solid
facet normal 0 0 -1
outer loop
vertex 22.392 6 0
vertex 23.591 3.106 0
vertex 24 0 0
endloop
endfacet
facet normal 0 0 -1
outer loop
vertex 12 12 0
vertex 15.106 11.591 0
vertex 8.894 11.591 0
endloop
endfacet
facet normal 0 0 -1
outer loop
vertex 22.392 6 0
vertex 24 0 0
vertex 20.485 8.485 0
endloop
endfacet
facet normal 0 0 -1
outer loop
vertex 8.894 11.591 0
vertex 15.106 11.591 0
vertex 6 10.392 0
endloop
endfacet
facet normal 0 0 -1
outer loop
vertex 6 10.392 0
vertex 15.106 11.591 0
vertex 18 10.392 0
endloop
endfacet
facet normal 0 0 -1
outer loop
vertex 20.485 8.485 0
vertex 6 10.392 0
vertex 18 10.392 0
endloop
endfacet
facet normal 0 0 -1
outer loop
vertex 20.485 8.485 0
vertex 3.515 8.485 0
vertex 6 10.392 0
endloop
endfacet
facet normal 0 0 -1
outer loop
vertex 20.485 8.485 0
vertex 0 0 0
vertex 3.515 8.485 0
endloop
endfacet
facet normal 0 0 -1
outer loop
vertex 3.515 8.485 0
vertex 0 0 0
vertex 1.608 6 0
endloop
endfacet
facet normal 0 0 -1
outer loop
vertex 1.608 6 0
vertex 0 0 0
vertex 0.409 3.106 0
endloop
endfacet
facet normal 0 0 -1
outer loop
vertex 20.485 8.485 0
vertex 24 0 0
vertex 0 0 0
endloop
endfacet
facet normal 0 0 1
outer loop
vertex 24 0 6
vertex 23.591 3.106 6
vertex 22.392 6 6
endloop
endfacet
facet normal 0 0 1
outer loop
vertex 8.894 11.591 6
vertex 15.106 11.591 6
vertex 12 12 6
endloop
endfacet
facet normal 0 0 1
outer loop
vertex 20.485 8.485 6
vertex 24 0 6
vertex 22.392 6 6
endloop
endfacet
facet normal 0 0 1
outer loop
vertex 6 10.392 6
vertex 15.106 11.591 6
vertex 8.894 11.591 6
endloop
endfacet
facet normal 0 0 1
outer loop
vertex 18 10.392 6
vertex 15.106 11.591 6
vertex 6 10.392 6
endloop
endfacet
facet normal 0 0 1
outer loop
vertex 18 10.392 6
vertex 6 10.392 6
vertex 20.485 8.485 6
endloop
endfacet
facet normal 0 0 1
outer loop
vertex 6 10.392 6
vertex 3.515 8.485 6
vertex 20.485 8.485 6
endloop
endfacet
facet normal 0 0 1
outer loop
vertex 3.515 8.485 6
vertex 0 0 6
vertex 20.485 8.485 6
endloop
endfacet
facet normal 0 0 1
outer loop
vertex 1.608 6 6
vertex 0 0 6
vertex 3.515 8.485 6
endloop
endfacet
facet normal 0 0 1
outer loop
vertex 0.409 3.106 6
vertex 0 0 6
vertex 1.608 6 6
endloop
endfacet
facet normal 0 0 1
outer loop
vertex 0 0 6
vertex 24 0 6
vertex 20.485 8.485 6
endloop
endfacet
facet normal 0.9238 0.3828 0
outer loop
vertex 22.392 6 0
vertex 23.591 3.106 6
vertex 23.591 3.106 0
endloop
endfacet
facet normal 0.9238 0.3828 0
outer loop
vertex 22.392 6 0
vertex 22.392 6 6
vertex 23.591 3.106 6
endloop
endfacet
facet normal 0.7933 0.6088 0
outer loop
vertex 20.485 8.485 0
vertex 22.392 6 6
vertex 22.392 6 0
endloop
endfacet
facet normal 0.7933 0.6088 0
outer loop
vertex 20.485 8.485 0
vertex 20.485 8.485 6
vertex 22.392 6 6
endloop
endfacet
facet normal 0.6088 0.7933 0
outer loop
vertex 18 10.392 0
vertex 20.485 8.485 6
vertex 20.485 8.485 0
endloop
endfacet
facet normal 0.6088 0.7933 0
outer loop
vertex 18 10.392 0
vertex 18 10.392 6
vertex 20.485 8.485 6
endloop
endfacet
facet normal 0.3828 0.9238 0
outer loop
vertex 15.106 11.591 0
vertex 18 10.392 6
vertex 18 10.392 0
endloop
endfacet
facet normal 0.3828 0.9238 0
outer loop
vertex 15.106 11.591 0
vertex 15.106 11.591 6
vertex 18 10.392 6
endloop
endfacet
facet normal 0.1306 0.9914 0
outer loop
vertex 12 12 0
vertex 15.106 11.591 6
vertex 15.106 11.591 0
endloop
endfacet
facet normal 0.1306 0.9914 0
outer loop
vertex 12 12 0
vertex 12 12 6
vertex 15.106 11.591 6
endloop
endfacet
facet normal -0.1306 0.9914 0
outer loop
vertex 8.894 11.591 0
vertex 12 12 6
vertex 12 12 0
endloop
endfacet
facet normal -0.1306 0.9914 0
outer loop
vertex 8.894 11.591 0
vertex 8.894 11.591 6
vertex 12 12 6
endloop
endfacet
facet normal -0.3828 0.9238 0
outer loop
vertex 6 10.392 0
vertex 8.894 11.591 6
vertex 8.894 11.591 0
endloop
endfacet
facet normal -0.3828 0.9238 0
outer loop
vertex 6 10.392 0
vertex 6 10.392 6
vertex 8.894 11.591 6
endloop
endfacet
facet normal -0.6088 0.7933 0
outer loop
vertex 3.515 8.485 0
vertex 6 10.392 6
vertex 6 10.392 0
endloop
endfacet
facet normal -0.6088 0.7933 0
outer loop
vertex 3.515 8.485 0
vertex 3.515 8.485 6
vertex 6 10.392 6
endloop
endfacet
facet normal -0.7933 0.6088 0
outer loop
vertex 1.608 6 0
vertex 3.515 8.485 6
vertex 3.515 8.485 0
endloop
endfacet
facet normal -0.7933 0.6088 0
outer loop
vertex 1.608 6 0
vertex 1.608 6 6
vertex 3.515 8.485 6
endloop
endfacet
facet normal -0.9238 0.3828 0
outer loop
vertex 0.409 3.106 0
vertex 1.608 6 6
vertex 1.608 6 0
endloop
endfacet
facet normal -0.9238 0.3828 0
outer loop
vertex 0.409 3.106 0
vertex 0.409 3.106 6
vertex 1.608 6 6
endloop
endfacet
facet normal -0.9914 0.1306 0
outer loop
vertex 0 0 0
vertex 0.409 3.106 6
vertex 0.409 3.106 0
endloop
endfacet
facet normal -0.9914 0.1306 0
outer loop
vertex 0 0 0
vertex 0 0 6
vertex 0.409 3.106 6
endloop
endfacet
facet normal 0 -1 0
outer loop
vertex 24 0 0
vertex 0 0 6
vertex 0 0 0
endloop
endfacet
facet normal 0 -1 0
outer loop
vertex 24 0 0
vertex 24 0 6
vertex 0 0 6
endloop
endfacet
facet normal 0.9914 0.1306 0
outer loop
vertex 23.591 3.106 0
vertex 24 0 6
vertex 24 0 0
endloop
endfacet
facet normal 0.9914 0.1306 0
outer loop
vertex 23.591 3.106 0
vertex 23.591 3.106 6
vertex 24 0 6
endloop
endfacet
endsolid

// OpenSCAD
$fn = 32;

// ----------------------------------------------------------------------
// Key bar: woodruff key, 6 mm thick
// ----------------------------------------------------------------------

// --- parameters (mm) ---
profile_height = 6;       // extrusion height
profile_points = 13;      // points of the closed outline

profile = [[24, 0], [23.591, 3.106], [22.392, 6], [20.485, 8.485], [18, 10.392], [15.106, 11.591], [12, 12], [8.894, 11.591], [6, 10.392], [3.515, 8.485], [1.608, 6], [0.409, 3.106], [0, 0]];  // single closed polygon, 13 points, counter clockwise

// --- the one profile operation ---
linear_extrude(height = profile_height) polygon(points = profile);
